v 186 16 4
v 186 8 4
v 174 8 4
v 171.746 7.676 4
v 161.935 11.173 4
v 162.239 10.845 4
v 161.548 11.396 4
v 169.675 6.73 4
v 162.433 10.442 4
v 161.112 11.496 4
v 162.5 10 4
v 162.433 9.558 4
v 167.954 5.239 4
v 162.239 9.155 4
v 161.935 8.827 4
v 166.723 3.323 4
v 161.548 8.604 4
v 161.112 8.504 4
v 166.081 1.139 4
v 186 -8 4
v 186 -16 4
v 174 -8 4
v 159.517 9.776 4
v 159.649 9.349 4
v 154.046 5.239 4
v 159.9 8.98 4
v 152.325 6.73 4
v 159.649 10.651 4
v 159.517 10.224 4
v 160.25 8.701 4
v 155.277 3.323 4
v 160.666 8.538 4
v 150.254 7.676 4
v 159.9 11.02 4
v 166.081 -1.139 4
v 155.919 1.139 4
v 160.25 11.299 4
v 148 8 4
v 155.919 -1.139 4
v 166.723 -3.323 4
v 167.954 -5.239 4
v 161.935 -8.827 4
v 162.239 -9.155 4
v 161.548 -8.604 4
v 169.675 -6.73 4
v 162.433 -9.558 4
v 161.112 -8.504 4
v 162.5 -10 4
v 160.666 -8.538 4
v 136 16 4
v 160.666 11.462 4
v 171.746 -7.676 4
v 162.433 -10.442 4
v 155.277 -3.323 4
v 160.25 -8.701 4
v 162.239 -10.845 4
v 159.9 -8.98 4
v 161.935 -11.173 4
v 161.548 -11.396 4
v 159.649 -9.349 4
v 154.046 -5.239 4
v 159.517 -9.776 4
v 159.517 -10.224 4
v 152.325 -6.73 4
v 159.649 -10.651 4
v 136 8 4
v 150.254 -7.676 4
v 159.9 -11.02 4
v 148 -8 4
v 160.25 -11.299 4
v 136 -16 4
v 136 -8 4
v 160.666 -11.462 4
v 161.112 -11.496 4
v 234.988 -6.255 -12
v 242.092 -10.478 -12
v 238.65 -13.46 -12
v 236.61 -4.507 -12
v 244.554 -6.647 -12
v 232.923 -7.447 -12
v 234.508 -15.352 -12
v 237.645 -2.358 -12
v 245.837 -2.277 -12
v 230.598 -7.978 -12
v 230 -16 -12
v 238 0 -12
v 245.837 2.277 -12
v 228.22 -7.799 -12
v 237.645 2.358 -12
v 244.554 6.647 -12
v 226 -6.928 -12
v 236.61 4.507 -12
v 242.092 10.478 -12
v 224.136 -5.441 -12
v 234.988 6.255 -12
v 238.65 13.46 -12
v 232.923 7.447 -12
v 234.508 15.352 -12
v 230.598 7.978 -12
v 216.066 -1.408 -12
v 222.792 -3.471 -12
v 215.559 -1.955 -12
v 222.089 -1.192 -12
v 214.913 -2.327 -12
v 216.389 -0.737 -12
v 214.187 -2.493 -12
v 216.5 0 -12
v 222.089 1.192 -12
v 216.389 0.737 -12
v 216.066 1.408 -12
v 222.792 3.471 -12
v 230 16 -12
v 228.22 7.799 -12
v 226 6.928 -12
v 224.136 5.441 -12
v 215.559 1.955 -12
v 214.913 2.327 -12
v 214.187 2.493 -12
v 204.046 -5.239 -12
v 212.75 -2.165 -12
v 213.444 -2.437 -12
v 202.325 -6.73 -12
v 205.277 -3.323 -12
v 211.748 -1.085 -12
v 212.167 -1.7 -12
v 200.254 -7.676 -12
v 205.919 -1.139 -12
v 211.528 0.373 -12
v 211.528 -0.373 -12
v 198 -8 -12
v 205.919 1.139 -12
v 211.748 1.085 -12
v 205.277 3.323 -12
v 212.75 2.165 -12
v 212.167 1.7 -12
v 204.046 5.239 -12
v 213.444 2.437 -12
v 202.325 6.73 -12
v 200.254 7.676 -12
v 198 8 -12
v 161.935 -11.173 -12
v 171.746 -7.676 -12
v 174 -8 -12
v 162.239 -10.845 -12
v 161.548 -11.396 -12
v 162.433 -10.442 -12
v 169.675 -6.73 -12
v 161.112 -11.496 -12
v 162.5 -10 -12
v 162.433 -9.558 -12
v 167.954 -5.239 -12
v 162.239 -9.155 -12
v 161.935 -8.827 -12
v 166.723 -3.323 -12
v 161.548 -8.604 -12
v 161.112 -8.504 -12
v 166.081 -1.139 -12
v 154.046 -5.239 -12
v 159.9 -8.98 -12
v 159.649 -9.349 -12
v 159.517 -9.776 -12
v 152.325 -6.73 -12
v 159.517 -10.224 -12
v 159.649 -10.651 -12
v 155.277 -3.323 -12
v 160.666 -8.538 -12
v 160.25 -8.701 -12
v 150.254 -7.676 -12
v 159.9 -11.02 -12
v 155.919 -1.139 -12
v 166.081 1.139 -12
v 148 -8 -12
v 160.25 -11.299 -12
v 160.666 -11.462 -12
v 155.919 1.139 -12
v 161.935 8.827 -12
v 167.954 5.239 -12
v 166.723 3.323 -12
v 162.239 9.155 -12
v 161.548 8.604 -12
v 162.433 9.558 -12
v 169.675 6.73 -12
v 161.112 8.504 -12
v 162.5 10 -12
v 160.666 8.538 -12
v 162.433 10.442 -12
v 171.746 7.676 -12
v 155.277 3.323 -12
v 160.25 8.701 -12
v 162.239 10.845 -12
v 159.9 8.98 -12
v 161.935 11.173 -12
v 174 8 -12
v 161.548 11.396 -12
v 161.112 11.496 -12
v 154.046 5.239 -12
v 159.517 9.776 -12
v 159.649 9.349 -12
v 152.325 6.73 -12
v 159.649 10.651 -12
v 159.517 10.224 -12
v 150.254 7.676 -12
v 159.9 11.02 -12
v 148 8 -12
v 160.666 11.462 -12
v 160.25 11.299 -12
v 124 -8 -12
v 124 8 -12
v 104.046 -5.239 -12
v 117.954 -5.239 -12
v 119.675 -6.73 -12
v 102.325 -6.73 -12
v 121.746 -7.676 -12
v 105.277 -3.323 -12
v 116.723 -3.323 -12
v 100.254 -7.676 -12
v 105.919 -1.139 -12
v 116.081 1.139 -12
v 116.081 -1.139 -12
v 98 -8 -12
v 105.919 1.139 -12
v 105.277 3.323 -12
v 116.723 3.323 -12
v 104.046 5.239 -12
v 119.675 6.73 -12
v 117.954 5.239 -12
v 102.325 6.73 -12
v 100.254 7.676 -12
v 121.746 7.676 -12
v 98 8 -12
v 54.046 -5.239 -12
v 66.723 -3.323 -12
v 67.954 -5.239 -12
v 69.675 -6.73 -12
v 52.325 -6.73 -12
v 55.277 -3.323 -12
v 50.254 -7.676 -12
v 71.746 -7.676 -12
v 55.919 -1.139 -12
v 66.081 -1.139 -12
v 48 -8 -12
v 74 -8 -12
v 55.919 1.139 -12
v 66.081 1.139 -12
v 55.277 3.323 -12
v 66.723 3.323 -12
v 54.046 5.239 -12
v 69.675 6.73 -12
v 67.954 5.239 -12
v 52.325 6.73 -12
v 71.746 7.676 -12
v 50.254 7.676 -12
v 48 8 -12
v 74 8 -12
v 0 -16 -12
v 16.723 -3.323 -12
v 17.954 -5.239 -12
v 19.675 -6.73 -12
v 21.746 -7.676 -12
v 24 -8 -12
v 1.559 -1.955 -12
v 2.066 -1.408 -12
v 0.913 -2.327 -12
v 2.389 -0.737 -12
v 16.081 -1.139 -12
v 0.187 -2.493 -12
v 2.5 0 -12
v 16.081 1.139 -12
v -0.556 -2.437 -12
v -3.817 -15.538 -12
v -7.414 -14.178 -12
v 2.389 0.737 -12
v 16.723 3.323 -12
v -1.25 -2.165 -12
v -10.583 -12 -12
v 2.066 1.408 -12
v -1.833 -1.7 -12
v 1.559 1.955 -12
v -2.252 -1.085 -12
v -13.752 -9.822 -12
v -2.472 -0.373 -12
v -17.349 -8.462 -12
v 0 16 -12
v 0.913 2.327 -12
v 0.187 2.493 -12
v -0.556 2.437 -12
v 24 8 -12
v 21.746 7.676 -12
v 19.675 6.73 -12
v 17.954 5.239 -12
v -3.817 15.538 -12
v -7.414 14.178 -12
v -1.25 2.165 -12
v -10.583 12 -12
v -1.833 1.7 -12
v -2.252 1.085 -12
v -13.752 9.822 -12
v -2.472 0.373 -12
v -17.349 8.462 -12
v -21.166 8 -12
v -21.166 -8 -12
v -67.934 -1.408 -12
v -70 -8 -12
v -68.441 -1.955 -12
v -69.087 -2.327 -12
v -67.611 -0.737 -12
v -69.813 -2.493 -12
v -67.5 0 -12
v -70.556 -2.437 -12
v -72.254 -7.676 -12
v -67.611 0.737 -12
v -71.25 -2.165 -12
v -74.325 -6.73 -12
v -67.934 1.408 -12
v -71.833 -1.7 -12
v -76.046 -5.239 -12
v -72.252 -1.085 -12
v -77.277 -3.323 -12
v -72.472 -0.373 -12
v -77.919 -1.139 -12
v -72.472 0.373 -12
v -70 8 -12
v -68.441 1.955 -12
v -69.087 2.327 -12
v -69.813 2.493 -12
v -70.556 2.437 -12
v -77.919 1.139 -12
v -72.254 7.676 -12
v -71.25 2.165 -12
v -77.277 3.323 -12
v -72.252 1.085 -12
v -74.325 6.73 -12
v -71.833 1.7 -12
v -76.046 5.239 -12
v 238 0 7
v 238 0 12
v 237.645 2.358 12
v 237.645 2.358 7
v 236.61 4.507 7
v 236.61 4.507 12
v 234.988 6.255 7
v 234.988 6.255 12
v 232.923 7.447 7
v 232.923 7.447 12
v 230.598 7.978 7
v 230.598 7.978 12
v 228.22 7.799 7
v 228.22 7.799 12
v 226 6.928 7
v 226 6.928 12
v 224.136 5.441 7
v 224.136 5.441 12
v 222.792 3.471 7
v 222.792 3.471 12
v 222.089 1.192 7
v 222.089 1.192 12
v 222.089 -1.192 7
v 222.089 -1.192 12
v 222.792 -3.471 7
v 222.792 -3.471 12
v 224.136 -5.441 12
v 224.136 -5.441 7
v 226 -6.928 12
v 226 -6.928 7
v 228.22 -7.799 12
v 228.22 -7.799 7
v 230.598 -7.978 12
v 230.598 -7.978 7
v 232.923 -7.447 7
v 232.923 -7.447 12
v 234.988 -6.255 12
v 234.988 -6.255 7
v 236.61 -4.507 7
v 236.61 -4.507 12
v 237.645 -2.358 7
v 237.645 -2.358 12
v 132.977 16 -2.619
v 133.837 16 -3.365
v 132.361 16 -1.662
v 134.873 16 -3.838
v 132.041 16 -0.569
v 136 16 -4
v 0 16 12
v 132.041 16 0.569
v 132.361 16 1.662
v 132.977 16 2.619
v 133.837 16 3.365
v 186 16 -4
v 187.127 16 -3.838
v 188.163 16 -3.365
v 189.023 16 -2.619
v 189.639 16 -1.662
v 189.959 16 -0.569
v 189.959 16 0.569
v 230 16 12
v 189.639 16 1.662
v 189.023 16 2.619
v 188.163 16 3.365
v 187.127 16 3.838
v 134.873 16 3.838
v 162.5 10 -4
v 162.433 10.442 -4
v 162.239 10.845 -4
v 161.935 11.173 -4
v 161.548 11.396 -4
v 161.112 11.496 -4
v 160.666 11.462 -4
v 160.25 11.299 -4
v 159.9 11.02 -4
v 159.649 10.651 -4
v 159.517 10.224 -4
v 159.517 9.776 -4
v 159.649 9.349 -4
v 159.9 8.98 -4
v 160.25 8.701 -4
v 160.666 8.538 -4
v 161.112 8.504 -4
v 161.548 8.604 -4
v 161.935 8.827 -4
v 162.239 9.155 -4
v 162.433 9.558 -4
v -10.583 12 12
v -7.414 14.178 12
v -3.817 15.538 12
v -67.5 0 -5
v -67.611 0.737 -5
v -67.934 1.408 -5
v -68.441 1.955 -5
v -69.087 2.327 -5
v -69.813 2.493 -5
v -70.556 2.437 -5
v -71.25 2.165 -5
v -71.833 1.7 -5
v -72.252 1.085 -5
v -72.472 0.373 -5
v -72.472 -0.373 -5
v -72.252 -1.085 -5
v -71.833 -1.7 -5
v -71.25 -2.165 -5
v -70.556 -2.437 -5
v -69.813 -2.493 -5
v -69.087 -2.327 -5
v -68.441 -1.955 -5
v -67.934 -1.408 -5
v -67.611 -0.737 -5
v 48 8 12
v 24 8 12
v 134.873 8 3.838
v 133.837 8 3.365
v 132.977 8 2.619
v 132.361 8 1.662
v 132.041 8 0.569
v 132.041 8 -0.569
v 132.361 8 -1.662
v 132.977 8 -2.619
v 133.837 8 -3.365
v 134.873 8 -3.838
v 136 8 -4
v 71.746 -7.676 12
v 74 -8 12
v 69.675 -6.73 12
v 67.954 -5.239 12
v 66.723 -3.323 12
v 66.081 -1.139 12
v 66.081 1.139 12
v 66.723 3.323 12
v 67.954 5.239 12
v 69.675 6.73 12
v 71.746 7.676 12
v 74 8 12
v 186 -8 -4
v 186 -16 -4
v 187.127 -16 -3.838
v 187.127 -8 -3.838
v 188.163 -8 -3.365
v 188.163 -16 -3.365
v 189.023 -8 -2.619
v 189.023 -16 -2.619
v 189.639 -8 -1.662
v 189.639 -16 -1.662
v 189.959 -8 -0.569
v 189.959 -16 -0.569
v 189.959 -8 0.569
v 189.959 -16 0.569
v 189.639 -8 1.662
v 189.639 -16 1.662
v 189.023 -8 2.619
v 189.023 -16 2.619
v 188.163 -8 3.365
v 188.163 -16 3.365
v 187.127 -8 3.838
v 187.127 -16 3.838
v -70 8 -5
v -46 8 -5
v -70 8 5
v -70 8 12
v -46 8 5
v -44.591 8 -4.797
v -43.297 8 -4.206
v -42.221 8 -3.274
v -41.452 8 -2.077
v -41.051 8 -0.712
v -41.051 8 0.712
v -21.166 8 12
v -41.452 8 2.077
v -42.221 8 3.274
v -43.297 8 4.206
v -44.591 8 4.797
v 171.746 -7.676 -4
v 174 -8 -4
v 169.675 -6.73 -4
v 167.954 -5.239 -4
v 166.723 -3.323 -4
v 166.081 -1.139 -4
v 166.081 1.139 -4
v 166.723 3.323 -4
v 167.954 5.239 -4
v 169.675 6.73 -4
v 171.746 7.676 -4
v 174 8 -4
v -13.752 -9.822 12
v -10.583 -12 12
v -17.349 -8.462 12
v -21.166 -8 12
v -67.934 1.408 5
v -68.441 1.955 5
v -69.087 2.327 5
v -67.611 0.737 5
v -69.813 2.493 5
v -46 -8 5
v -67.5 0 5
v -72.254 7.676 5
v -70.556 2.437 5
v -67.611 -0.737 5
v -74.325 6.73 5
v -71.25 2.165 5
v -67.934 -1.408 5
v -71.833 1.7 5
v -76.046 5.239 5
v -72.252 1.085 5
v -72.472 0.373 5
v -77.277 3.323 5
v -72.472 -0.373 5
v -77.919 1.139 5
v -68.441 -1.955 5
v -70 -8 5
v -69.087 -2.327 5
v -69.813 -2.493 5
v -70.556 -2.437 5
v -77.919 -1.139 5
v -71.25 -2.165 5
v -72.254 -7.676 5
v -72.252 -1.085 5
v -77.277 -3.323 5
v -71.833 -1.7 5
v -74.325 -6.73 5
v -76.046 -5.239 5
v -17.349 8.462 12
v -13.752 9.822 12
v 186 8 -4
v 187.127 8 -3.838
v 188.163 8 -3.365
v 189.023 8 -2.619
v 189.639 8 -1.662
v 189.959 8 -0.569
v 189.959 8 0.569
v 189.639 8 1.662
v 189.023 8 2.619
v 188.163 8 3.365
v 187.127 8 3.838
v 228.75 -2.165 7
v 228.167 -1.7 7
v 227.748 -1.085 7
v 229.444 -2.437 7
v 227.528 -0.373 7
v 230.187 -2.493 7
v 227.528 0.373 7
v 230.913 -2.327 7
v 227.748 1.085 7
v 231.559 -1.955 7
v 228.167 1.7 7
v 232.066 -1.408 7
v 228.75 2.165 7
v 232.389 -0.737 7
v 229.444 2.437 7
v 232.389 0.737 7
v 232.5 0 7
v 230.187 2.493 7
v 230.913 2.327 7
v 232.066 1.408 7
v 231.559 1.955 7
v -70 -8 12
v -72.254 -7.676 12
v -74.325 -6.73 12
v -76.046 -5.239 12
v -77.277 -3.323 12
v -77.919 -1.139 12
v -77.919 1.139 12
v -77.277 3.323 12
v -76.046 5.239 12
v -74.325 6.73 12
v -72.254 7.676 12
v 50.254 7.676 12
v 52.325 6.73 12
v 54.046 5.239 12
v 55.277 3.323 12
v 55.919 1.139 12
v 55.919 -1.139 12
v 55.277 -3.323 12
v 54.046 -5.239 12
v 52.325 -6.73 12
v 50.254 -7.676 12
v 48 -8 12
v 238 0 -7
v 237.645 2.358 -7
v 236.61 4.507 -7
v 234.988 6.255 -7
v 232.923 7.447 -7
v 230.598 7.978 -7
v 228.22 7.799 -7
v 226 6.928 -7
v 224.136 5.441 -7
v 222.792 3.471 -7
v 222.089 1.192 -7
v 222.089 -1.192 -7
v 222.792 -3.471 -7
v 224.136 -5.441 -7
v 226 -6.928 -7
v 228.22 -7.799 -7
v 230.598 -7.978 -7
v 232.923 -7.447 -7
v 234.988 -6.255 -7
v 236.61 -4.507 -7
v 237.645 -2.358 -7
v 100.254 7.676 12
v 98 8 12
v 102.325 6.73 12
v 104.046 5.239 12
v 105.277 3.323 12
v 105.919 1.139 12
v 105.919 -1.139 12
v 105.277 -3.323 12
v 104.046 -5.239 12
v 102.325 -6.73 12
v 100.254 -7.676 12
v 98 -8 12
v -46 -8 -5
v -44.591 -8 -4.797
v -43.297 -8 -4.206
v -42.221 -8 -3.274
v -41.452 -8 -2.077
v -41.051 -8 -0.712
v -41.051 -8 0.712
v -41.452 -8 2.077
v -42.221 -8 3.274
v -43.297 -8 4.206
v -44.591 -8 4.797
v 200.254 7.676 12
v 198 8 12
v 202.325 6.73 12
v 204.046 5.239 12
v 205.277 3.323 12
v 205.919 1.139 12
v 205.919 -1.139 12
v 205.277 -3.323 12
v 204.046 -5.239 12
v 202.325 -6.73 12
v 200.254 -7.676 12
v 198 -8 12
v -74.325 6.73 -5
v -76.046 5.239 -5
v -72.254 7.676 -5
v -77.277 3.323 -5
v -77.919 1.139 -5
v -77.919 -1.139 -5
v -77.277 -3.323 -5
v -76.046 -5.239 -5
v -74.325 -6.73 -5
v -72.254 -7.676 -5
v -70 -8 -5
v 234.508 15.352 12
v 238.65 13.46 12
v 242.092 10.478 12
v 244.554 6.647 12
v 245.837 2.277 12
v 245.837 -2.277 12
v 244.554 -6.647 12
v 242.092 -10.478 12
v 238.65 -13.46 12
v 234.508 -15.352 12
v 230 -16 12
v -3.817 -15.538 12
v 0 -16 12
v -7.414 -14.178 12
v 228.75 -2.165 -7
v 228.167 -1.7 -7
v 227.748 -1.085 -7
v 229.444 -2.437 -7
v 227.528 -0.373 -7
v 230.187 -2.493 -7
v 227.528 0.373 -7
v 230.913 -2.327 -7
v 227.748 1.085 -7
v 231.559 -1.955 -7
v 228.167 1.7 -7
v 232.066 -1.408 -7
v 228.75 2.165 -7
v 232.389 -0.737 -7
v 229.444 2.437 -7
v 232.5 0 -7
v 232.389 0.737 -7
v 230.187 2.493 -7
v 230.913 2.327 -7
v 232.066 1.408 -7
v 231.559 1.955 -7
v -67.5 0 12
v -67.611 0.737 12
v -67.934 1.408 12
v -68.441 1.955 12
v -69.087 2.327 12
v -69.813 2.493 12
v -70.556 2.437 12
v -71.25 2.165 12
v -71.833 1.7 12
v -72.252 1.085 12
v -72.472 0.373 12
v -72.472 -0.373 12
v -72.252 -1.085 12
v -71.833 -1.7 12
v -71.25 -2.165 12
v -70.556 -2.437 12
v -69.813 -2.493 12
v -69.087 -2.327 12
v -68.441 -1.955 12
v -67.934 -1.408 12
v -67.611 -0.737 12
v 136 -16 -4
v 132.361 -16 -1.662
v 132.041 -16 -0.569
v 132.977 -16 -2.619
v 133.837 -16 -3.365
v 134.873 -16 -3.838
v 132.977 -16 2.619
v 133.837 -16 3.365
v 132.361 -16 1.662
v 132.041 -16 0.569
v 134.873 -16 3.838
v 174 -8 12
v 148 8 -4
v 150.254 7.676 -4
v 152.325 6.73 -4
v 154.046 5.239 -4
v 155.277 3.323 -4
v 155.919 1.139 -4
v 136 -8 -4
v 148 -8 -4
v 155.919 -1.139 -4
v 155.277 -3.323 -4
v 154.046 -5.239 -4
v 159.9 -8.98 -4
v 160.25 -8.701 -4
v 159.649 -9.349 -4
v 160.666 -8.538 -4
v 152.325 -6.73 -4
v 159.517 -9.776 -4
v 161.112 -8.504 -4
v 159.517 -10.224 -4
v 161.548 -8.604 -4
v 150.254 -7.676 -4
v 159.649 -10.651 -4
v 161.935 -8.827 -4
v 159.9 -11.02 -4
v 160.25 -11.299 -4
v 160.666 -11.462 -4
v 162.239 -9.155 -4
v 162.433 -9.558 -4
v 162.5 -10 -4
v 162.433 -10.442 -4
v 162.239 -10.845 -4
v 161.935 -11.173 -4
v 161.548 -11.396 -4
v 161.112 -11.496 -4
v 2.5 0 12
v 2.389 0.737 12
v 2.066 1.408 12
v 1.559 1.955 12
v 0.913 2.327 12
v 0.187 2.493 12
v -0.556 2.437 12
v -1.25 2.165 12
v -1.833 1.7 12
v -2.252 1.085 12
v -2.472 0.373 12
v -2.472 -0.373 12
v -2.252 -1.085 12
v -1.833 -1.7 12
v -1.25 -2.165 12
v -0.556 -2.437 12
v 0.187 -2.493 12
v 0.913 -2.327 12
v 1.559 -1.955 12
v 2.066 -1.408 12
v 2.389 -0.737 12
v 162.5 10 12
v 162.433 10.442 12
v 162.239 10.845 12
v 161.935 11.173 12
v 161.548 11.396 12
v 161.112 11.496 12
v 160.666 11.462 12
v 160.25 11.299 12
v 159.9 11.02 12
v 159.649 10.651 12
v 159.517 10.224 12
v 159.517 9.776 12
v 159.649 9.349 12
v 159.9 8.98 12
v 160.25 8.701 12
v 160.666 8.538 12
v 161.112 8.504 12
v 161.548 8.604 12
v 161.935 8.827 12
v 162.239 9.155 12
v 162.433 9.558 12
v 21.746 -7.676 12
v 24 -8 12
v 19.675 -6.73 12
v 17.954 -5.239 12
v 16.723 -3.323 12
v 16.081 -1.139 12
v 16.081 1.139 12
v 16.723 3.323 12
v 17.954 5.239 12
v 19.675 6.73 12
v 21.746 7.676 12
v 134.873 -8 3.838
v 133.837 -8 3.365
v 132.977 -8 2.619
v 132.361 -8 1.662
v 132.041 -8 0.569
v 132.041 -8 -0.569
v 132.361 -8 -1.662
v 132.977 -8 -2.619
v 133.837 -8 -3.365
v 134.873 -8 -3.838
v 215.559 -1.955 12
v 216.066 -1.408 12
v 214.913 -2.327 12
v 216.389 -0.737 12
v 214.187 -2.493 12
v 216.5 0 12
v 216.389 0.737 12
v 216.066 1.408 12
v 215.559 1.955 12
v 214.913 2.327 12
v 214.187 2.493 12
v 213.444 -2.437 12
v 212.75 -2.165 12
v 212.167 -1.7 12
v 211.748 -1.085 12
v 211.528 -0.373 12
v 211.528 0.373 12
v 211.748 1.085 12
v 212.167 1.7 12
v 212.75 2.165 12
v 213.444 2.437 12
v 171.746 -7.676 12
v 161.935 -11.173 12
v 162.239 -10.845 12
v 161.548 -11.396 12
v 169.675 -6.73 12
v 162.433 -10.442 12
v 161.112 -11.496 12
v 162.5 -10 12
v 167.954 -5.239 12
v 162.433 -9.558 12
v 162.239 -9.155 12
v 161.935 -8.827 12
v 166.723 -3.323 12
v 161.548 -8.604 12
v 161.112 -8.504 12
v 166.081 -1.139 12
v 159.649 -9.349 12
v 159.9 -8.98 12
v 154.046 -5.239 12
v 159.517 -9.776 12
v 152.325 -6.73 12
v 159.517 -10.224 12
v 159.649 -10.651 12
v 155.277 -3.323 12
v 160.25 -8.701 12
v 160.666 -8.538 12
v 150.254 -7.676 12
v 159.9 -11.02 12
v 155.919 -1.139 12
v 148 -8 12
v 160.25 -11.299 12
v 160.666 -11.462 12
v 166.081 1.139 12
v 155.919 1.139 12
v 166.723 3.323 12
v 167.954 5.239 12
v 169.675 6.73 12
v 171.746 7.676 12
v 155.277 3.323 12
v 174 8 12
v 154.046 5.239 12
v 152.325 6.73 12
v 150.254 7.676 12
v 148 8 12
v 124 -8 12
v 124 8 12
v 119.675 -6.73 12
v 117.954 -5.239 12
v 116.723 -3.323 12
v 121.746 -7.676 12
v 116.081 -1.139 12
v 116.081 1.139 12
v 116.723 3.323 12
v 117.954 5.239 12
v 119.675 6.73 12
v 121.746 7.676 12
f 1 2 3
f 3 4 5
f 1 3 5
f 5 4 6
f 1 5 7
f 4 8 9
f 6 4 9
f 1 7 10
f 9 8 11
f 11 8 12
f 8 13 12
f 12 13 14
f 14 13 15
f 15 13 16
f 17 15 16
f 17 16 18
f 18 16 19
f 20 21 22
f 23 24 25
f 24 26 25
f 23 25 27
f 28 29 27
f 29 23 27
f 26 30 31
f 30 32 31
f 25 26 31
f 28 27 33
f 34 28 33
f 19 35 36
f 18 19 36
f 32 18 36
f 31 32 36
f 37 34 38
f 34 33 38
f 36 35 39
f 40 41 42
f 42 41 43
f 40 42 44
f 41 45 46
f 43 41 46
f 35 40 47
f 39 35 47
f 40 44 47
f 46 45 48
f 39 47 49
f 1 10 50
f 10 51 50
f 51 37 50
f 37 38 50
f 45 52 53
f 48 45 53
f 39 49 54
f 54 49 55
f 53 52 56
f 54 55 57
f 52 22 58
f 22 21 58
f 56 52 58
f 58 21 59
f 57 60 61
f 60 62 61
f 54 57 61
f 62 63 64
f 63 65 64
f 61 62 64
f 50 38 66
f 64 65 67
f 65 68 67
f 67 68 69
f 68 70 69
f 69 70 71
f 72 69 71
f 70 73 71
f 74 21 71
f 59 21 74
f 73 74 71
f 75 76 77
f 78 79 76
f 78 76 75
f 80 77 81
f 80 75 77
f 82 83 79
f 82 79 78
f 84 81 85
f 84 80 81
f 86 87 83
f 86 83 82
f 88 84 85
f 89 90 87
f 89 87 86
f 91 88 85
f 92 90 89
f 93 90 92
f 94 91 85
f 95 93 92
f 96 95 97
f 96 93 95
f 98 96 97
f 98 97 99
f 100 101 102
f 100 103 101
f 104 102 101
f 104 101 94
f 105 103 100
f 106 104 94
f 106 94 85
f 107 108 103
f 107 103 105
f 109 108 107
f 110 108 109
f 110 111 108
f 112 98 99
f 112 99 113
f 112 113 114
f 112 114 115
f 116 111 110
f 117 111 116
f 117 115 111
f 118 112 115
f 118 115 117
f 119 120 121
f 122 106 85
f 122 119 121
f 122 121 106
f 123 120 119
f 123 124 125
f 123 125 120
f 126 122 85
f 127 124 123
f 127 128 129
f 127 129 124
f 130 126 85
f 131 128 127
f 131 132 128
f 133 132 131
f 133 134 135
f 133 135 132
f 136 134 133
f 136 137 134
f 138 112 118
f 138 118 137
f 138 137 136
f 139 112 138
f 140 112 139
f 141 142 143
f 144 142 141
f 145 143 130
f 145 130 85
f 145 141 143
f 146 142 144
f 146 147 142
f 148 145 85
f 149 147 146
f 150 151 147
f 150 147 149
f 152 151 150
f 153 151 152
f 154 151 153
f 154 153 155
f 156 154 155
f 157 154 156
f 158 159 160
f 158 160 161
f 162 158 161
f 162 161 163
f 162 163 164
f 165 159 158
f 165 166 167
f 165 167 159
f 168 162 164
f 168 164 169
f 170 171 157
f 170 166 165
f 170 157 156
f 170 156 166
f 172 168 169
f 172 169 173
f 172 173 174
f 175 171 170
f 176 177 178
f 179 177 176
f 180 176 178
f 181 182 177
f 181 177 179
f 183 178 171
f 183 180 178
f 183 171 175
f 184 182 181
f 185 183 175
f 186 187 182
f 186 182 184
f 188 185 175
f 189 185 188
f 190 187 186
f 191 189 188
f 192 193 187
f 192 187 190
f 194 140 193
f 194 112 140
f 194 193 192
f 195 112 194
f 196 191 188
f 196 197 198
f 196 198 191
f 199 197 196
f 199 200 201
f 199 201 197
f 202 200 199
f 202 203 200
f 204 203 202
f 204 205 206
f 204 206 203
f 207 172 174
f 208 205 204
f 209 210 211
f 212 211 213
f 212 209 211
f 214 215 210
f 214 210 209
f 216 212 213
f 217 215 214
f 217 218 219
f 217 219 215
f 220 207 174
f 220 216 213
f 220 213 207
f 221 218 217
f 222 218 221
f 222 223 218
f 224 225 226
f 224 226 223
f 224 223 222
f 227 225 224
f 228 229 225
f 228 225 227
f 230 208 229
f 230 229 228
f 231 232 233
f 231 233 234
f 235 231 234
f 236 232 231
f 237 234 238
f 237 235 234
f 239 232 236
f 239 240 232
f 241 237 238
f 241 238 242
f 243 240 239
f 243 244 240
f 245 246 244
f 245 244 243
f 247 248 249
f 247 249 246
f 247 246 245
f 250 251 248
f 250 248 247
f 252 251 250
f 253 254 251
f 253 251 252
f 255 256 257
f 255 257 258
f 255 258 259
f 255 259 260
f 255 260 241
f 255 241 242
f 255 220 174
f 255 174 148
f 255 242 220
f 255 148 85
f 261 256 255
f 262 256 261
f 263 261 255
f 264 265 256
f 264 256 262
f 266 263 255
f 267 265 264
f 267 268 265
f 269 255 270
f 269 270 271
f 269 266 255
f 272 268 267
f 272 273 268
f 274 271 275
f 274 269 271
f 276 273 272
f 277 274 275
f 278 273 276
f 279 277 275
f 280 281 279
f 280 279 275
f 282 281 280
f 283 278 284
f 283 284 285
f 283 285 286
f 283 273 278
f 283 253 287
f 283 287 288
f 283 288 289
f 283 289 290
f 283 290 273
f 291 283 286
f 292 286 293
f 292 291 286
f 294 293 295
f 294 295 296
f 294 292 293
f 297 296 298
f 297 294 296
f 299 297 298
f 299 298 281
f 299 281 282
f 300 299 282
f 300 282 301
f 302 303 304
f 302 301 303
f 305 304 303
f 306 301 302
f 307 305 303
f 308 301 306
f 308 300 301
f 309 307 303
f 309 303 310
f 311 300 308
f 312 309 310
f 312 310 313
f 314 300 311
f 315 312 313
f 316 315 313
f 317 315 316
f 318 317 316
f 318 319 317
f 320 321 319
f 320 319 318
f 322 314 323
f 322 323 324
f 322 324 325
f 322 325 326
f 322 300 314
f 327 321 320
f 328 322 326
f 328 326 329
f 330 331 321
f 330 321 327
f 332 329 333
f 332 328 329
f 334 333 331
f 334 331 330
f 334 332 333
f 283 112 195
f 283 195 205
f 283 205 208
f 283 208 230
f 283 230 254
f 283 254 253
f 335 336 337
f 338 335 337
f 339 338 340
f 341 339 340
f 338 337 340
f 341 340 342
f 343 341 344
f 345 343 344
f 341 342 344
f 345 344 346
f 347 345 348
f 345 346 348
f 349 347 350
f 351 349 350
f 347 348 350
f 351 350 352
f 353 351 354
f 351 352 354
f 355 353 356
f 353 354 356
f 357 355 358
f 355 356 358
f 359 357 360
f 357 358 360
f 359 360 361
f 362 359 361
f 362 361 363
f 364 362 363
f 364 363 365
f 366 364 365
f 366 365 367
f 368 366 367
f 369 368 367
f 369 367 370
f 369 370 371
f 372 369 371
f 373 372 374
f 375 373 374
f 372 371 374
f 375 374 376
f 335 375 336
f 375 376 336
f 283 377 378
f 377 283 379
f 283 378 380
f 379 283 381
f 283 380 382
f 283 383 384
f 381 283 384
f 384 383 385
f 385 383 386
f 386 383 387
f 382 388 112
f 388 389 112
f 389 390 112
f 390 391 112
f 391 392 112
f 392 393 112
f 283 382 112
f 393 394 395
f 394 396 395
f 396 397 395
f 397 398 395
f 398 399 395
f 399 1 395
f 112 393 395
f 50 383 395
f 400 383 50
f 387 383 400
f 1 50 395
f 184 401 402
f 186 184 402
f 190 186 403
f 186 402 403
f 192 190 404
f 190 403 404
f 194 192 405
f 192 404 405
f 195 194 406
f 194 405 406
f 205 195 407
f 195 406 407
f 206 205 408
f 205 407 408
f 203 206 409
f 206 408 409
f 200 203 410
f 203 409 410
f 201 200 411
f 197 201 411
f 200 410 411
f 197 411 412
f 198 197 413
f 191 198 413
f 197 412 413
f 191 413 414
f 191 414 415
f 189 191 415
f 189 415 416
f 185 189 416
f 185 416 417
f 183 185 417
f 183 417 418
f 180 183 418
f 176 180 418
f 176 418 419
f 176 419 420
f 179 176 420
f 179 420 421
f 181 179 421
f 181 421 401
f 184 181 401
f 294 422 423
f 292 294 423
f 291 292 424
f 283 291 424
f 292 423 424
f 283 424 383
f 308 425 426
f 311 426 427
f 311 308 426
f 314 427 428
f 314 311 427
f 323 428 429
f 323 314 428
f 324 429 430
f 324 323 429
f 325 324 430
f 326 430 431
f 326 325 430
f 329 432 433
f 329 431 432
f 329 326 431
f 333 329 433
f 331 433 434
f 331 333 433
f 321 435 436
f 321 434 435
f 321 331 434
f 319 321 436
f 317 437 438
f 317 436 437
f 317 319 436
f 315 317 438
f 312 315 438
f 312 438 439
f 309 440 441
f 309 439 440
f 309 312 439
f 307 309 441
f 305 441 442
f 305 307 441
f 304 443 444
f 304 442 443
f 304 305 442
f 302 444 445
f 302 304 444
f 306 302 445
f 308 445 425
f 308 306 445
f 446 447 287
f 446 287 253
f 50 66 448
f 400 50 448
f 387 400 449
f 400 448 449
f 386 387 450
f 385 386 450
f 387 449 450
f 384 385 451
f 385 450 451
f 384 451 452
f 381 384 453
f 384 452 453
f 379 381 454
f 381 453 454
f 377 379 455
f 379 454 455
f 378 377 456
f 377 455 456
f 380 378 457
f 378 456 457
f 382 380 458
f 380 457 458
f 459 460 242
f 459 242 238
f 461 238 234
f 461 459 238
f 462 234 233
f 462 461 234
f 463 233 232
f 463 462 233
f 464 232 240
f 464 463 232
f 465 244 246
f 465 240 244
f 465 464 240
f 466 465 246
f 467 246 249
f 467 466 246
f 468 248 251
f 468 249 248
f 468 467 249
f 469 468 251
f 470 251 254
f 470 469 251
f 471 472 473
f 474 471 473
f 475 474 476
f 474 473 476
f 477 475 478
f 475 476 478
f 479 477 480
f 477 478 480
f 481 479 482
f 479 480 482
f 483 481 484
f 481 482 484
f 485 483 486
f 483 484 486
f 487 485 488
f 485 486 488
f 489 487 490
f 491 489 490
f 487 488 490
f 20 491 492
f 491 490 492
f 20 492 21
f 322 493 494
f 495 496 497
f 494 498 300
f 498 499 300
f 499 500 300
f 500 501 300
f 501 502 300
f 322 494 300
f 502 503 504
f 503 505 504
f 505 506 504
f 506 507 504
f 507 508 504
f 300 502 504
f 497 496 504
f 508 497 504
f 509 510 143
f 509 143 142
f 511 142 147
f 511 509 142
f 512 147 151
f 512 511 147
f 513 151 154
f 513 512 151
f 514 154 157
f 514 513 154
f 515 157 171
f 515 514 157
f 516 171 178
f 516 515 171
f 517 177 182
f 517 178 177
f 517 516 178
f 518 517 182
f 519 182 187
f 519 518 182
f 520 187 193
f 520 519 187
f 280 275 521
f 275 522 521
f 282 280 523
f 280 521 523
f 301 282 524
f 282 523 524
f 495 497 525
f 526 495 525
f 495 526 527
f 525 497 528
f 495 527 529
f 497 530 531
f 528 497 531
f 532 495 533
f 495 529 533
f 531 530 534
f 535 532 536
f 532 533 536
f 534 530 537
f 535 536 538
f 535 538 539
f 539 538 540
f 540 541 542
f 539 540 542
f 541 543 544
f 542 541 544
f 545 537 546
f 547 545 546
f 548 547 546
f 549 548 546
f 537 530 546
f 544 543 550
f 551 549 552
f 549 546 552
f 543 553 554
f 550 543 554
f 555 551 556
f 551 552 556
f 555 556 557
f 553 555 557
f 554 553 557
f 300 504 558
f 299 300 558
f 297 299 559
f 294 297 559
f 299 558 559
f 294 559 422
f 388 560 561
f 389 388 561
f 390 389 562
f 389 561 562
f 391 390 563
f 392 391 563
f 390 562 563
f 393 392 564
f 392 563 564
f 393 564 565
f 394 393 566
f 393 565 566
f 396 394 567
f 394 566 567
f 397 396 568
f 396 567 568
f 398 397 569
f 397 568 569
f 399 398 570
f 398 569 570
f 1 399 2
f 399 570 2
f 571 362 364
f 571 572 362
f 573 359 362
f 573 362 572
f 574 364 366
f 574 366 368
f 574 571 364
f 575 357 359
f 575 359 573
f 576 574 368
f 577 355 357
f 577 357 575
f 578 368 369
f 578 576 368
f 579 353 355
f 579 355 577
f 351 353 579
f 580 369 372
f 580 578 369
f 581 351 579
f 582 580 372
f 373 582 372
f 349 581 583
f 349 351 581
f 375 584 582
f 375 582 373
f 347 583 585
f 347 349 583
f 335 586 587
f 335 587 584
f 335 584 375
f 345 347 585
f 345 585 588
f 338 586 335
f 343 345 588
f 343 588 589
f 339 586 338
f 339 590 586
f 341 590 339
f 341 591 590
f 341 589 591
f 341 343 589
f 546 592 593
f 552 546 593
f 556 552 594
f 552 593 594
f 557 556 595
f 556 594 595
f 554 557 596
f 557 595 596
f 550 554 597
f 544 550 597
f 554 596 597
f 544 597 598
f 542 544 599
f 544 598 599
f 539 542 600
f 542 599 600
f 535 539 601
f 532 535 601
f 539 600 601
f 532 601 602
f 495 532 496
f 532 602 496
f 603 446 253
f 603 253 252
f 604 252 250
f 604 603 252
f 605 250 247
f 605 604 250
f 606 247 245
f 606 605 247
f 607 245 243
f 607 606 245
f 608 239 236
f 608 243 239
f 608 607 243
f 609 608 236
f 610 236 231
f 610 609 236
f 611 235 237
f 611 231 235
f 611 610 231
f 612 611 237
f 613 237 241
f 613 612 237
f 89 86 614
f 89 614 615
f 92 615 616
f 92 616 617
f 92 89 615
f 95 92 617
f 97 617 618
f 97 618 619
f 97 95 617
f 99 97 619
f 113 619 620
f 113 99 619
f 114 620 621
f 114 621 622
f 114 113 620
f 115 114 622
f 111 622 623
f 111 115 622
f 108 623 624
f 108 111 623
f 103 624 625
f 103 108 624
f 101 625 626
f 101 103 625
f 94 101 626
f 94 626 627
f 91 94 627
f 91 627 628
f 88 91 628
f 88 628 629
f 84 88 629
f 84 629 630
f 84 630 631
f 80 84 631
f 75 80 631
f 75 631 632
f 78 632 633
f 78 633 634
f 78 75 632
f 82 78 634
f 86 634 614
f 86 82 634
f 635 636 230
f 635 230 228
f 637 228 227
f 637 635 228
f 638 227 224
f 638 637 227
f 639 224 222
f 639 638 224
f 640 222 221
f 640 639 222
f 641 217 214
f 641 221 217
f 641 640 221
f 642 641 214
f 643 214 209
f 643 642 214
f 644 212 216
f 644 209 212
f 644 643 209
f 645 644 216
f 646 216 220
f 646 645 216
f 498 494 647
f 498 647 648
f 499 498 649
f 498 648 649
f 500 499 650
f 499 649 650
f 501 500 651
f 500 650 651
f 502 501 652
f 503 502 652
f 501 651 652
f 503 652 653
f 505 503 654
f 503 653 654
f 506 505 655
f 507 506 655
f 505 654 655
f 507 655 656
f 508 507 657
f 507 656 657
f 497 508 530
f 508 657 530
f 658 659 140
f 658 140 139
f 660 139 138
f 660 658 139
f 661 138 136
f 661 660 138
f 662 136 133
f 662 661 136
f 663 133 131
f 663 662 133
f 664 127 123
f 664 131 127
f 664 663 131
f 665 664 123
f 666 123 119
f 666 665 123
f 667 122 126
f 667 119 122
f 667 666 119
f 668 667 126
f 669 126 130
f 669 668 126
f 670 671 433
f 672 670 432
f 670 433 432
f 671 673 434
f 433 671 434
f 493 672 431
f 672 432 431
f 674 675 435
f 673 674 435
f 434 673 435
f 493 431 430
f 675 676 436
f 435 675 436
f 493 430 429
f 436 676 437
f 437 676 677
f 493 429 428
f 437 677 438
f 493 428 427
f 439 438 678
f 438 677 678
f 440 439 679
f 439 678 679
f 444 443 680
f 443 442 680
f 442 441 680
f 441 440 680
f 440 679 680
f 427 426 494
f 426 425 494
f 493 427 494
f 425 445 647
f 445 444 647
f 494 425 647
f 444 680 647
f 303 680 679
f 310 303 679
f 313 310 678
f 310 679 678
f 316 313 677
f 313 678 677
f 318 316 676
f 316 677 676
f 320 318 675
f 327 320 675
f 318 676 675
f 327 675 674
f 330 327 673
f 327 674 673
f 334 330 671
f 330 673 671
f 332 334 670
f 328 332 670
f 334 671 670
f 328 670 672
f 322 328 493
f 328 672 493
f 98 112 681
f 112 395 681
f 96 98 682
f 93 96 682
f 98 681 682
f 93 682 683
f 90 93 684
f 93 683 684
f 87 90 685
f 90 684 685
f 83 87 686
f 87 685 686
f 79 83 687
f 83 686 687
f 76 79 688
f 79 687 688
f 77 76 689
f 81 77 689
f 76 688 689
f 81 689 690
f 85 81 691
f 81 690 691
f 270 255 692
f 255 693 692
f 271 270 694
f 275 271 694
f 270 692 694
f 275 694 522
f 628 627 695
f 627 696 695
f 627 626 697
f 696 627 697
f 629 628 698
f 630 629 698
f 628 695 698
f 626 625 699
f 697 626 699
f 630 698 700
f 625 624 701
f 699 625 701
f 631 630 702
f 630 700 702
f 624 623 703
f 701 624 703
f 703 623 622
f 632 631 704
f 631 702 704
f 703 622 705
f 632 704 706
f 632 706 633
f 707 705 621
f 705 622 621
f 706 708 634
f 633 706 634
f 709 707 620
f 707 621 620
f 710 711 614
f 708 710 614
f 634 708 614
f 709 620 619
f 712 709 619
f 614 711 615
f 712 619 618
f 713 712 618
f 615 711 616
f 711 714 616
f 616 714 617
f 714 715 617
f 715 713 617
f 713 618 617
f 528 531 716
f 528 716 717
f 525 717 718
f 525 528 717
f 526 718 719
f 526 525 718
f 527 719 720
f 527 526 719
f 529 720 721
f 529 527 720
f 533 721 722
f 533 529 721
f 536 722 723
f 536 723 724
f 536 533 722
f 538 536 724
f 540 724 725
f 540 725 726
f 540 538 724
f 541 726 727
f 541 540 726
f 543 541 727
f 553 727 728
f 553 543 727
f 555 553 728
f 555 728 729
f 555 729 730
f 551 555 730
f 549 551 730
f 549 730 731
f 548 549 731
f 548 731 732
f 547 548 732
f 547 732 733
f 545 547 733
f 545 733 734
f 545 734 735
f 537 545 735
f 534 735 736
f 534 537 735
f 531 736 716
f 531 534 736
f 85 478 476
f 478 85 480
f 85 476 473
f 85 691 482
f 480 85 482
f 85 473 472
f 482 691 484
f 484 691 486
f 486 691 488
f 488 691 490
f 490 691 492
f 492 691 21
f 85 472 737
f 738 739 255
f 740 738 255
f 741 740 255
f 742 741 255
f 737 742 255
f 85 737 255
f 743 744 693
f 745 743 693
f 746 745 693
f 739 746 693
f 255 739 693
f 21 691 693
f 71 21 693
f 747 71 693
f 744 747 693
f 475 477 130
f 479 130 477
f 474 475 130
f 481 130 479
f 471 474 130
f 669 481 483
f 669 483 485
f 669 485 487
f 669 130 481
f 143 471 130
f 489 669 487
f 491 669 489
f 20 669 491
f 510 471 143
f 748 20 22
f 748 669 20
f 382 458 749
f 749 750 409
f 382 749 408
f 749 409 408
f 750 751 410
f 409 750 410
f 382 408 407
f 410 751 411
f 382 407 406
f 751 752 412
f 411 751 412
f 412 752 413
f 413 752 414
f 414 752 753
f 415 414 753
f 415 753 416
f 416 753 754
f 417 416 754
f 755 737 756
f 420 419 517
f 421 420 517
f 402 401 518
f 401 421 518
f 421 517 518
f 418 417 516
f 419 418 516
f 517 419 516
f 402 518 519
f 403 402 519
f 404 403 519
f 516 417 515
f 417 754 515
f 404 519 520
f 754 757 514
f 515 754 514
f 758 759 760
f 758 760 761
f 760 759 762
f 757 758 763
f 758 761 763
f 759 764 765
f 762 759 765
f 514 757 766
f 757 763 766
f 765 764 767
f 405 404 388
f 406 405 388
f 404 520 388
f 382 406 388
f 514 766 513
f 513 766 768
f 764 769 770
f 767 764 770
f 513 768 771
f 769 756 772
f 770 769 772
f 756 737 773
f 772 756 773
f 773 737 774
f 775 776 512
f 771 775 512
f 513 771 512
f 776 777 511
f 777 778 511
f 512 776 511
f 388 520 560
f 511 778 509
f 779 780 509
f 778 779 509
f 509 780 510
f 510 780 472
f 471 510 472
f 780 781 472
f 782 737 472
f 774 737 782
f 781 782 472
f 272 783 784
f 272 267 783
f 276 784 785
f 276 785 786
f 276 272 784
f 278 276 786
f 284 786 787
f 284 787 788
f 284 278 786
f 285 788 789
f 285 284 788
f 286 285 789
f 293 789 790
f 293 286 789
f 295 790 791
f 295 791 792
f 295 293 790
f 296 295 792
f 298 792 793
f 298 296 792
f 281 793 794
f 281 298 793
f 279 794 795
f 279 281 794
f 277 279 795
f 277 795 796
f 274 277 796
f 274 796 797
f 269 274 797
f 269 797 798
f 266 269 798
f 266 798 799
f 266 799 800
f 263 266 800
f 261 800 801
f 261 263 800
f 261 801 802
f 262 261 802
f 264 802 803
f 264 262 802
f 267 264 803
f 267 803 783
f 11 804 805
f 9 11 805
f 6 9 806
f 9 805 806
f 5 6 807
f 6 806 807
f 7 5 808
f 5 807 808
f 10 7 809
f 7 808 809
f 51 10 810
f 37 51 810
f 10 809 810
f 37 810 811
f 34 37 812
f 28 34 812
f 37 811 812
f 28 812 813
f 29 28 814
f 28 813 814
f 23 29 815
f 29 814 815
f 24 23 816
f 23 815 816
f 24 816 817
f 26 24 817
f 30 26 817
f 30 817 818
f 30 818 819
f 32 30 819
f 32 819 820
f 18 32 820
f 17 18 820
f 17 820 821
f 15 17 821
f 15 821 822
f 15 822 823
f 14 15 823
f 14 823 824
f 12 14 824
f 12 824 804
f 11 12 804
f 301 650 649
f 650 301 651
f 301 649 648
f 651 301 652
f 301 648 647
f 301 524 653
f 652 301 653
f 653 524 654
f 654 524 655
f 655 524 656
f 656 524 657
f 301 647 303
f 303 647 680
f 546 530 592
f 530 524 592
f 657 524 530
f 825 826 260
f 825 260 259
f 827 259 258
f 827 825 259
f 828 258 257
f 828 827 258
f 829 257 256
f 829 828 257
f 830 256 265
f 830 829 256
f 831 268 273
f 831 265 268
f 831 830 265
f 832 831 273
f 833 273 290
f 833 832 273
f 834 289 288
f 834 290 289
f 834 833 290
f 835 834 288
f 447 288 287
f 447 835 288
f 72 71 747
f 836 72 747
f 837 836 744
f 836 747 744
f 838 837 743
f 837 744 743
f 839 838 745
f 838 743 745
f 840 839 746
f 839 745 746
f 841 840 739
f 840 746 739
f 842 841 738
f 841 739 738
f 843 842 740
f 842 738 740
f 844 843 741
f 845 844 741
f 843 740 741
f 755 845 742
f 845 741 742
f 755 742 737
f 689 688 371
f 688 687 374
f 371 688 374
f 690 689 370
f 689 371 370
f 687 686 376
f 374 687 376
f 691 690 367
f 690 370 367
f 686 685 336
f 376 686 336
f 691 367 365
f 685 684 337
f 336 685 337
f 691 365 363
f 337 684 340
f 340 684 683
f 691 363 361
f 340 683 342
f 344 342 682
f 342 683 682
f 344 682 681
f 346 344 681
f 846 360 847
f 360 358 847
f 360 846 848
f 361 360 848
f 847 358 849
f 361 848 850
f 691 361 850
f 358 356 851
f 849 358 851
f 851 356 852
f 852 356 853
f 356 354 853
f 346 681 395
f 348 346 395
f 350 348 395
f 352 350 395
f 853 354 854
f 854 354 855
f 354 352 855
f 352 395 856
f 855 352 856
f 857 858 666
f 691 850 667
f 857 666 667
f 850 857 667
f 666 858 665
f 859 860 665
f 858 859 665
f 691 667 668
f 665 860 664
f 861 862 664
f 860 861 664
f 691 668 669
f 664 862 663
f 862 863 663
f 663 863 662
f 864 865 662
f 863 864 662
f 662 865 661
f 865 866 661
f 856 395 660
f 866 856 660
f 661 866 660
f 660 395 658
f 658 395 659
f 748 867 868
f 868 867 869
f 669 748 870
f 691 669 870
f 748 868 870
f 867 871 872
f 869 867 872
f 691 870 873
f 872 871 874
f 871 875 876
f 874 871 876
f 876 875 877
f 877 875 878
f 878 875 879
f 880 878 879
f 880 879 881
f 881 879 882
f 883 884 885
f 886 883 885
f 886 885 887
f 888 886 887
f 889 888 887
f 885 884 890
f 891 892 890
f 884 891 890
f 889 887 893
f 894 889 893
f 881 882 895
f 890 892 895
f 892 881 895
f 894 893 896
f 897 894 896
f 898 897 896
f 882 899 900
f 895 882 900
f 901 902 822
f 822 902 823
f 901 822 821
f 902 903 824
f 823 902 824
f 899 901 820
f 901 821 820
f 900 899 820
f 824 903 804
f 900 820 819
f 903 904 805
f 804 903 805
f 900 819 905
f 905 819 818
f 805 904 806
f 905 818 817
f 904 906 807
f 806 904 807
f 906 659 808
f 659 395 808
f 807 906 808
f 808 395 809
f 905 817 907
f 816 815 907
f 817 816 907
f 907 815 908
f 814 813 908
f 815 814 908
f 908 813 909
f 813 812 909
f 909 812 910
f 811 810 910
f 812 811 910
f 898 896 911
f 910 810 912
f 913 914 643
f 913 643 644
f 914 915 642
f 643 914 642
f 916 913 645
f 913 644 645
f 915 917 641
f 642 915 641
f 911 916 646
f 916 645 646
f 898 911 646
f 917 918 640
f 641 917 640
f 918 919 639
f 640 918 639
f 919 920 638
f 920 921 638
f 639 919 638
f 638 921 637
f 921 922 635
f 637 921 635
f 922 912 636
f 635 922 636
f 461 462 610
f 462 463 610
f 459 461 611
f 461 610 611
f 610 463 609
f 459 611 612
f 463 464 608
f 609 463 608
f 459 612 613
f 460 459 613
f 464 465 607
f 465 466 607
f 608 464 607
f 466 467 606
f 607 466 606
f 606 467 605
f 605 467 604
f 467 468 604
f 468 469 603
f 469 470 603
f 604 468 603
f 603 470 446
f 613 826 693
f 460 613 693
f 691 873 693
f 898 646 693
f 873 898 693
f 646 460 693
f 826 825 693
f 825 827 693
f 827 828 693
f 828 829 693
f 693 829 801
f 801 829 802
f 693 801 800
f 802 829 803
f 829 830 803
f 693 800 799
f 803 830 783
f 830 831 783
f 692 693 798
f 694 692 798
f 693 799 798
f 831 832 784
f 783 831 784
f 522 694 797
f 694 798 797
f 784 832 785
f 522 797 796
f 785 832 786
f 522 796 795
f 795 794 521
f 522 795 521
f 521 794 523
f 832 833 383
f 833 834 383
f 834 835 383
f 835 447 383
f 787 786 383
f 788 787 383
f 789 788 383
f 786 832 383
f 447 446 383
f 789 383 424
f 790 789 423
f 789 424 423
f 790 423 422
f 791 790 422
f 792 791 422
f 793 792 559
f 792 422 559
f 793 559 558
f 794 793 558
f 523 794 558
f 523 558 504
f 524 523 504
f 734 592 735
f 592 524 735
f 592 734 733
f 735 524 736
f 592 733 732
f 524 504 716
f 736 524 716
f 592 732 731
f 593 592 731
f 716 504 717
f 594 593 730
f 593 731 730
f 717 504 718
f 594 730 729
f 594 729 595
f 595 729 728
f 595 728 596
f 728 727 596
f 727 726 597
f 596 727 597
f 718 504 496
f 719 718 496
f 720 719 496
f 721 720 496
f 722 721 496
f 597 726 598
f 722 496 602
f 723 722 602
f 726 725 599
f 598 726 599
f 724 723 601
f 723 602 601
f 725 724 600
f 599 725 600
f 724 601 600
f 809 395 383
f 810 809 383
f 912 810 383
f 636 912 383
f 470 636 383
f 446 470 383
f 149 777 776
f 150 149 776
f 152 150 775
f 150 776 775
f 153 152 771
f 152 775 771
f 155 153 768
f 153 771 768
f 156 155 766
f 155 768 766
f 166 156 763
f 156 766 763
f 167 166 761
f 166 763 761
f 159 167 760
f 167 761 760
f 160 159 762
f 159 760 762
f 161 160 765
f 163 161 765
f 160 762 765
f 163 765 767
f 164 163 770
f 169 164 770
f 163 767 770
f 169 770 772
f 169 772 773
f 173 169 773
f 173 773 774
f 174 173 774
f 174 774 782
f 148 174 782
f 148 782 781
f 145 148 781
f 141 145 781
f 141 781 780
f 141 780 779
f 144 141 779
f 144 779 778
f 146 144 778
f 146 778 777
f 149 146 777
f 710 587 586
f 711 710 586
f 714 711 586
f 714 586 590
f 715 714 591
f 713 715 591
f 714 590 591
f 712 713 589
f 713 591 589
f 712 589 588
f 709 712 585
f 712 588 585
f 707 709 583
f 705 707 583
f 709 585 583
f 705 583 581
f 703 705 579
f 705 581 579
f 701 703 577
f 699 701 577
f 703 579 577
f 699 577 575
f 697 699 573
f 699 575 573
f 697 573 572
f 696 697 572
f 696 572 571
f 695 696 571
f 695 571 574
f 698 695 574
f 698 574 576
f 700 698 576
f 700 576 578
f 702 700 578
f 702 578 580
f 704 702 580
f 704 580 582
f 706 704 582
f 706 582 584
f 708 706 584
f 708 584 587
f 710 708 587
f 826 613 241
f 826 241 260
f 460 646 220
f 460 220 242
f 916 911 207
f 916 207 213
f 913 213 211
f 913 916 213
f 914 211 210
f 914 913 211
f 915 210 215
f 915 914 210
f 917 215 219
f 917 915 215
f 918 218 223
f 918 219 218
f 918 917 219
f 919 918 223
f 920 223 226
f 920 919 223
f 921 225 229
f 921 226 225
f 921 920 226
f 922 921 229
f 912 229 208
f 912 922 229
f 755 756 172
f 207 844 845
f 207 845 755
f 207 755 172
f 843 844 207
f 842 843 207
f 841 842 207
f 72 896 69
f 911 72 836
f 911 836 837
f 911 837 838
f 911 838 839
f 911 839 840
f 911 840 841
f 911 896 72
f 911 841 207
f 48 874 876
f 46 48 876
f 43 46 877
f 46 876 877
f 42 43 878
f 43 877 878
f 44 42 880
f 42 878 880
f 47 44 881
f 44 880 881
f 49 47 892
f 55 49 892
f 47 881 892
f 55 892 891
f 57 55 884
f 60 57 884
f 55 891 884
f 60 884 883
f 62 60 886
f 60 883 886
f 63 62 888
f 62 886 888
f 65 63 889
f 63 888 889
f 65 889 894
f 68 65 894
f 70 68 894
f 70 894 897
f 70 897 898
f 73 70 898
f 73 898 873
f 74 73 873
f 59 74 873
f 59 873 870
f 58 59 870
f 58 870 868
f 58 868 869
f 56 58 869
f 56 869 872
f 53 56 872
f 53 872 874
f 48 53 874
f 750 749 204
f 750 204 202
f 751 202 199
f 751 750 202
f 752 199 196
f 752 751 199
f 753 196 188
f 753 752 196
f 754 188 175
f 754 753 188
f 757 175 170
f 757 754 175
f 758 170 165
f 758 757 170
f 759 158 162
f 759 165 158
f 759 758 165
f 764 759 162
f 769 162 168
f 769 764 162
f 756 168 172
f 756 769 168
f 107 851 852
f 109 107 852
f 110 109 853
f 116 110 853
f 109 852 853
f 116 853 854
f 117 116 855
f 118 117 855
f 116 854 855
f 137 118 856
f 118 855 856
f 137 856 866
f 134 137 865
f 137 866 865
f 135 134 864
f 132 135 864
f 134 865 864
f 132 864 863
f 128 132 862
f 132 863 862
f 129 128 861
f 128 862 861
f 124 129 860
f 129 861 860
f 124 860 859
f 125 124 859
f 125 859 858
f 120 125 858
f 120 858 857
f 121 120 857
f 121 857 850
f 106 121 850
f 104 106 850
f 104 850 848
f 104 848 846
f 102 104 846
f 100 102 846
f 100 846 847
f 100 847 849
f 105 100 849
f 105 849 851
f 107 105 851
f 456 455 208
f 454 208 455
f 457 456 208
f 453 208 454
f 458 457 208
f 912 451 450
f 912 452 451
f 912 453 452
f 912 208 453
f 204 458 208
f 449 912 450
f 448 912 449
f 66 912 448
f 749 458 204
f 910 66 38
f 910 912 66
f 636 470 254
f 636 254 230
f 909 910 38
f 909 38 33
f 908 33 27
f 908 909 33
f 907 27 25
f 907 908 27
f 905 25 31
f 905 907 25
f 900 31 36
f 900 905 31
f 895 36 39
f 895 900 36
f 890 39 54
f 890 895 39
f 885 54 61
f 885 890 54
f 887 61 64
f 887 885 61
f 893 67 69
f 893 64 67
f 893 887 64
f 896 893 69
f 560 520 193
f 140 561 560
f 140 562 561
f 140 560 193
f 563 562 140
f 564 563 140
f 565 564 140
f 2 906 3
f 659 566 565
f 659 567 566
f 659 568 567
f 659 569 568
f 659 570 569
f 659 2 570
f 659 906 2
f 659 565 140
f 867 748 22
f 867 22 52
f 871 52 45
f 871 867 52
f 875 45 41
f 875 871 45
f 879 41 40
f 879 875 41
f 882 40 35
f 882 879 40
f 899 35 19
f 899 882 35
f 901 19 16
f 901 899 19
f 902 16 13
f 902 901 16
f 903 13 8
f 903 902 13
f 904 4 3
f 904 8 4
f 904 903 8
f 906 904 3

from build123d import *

# Parameters (mm, degrees)
SKETCH1_R               = 2.5
BOSS_EXTRUDE1_DEPTH     = 12
CUT_EXTRUDE1_REACH      = 249.459
CUT_EXTRUDE3_REACH      = 249.685
LPATTERN1_COUNT         = 4
LPATTERN1_PITCH         = 50
CUT_EXTRUDE4_REACH      = 249.685
SKETCH5_R               = 2.5
SKETCH6_R               = 8
CUT_EXTRUDE5_DEPTH      = 5
CUT_EXTRUDE7_DEPTH      = 248.459087528
CUT_EXTRUDE7_DEPTH_BACK = 248.459087528
SKETCH9_R               = 1.5
CUT_EXTRUDE8_DEPTH      = 248.685284181


with BuildPart() as part:
    # Sketch1 → Boss-Extrude1 (new, symmetric)
    with BuildSketch(Plane.XY):
        with BuildLine():
            Line((0, 16), (230, 16))
            ThreePointArc((230, 16), (246, 0), (230, -16))
            Line((230, -16), (0, -16))
            ThreePointArc((0, -16), (-5.656854249, -14.966629547), (-10.583005244, -12))
            ThreePointArc((-10.583005244, -12), (-15.509156239, -9.033370453), (-21.166010489, -8))
            Line((-21.166010489, -8), (-70, -8))
            ThreePointArc((-70, -8), (-78, 0), (-70, 8))
            Line((-70, 8), (-21.166010489, 8))
            ThreePointArc((-21.166010489, 8), (-15.509156239, 9.033370453), (-10.583005244, 12))
            ThreePointArc((-10.583005244, 12), (-5.656854249, 14.966629547), (0, 16))
        make_face()
        Circle(SKETCH1_R, mode=Mode.SUBTRACT)
        with Locations((-70, 0)):
            Circle(SKETCH1_R, mode=Mode.SUBTRACT)
    extrude(amount=BOSS_EXTRUDE1_DEPTH, both=True)

    # Sketch2 → Cut-Extrude1 (cut, up to next)
    with BuildSketch(Plane.XZ.offset(8), mode=Mode.PRIVATE) as cut_extrude1_sk1:
        with BuildLine():
            Line((-78, -5), (-46, -5))
            ThreePointArc((-46, -5), (-41, 0), (-46, 5))
            Line((-46, 5), (-78, 5))
            Line((-78, 5), (-78, -5))
        make_face()
    cut_extrude1_tool1 = extrude(cut_extrude1_sk1.sketch, amount=-CUT_EXTRUDE1_REACH, mode=Mode.PRIVATE) & part.part
    add(cut_extrude1_tool1.solids().sort_by_distance((-60.019172, -8, 0))[0], mode=Mode.SUBTRACT)

    # Sketch4 → Cut-Extrude3 (cut, up to next)
    with BuildSketch(Plane.XY.offset(12), mode=Mode.PRIVATE) as cut_extrude3_sk1:
        with BuildLine():
            Line((24, 8), (48, 8))
            ThreePointArc((48, 8), (56, 0), (48, -8))
            Line((48, -8), (24, -8))
            ThreePointArc((24, -8), (16, 0), (24, 8))
        make_face()
    cut_extrude3_tool1 = extrude(cut_extrude3_sk1.sketch, amount=-CUT_EXTRUDE3_REACH, mode=Mode.PRIVATE) & part.part
    cut_extrude3 = cut_extrude3_tool1.solids().sort_by_distance((36, 0, 12))[0]
    add(cut_extrude3, mode=Mode.SUBTRACT)

    # LPattern1: Cut-Extrude3 ×4
    with Locations(*[(i * LPATTERN1_PITCH, 0, 0) for i in range(1, LPATTERN1_COUNT)]):
        add(cut_extrude3, mode=Mode.SUBTRACT)

    # Sketch5 → Cut-Extrude4 (cut, up to next)
    with BuildSketch(Plane.XY.offset(12), mode=Mode.PRIVATE) as cut_extrude4_sk1:
        with Locations((230, 0)):
            Circle(SKETCH5_R)
    cut_extrude4_tool1 = extrude(cut_extrude4_sk1.sketch, amount=-CUT_EXTRUDE4_REACH, mode=Mode.PRIVATE) & part.part
    # Sketch5 → Cut-Extrude4 (cut, up to next)
    with BuildSketch(Plane.XY.offset(12), mode=Mode.PRIVATE) as cut_extrude4_sk2:
        with Locations((214, 0)):
            Circle(SKETCH5_R)
    cut_extrude4_tool2 = extrude(cut_extrude4_sk2.sketch, amount=-CUT_EXTRUDE4_REACH, mode=Mode.PRIVATE) & part.part
    add(cut_extrude4_tool1.solids().sort_by_distance((230, 0, 12))[0], mode=Mode.SUBTRACT)
    add(cut_extrude4_tool2.solids().sort_by_distance((214, 0, 12))[0], mode=Mode.SUBTRACT)

    # Sketch6 → Cut-Extrude5 (cut)
    with BuildSketch(Plane.XY.offset(12)):
        with Locations((230, 0)):
            Circle(SKETCH6_R)
    cut_extrude5 = extrude(amount=-CUT_EXTRUDE5_DEPTH, mode=Mode.SUBTRACT)

    # Mirror1: Cut-Extrude5 across plane
    add(cut_extrude5.mirror(Plane.XY), mode=Mode.SUBTRACT)

    # Sketch8 → Cut-Extrude7 (cut, two sides: drawn at the far end of the back side and taken through both)
    with BuildSketch(Plane(origin=(0, -8, 0), x_dir=(1, 0, 0), z_dir=(0, 1, 0)).offset(-CUT_EXTRUDE7_DEPTH_BACK)):
        with BuildLine():
            Line((136, 4), (186, 4))
            ThreePointArc((186, 4), (190, 0), (186, -4))
            Line((186, -4), (136, -4))
            ThreePointArc((136, -4), (132, 0), (136, 4))
        make_face()
    extrude(amount=CUT_EXTRUDE7_DEPTH + CUT_EXTRUDE7_DEPTH_BACK, mode=Mode.SUBTRACT)

    # Sketch9 → Cut-Extrude8 (cut, through all)
    with BuildSketch(Plane.XY.offset(12)):
        with Locations((161, 10)):
            Circle(SKETCH9_R)
        with Locations((161, -10)):
            Circle(SKETCH9_R)
    extrude(amount=-CUT_EXTRUDE8_DEPTH, mode=Mode.SUBTRACT)


solid = part.part
